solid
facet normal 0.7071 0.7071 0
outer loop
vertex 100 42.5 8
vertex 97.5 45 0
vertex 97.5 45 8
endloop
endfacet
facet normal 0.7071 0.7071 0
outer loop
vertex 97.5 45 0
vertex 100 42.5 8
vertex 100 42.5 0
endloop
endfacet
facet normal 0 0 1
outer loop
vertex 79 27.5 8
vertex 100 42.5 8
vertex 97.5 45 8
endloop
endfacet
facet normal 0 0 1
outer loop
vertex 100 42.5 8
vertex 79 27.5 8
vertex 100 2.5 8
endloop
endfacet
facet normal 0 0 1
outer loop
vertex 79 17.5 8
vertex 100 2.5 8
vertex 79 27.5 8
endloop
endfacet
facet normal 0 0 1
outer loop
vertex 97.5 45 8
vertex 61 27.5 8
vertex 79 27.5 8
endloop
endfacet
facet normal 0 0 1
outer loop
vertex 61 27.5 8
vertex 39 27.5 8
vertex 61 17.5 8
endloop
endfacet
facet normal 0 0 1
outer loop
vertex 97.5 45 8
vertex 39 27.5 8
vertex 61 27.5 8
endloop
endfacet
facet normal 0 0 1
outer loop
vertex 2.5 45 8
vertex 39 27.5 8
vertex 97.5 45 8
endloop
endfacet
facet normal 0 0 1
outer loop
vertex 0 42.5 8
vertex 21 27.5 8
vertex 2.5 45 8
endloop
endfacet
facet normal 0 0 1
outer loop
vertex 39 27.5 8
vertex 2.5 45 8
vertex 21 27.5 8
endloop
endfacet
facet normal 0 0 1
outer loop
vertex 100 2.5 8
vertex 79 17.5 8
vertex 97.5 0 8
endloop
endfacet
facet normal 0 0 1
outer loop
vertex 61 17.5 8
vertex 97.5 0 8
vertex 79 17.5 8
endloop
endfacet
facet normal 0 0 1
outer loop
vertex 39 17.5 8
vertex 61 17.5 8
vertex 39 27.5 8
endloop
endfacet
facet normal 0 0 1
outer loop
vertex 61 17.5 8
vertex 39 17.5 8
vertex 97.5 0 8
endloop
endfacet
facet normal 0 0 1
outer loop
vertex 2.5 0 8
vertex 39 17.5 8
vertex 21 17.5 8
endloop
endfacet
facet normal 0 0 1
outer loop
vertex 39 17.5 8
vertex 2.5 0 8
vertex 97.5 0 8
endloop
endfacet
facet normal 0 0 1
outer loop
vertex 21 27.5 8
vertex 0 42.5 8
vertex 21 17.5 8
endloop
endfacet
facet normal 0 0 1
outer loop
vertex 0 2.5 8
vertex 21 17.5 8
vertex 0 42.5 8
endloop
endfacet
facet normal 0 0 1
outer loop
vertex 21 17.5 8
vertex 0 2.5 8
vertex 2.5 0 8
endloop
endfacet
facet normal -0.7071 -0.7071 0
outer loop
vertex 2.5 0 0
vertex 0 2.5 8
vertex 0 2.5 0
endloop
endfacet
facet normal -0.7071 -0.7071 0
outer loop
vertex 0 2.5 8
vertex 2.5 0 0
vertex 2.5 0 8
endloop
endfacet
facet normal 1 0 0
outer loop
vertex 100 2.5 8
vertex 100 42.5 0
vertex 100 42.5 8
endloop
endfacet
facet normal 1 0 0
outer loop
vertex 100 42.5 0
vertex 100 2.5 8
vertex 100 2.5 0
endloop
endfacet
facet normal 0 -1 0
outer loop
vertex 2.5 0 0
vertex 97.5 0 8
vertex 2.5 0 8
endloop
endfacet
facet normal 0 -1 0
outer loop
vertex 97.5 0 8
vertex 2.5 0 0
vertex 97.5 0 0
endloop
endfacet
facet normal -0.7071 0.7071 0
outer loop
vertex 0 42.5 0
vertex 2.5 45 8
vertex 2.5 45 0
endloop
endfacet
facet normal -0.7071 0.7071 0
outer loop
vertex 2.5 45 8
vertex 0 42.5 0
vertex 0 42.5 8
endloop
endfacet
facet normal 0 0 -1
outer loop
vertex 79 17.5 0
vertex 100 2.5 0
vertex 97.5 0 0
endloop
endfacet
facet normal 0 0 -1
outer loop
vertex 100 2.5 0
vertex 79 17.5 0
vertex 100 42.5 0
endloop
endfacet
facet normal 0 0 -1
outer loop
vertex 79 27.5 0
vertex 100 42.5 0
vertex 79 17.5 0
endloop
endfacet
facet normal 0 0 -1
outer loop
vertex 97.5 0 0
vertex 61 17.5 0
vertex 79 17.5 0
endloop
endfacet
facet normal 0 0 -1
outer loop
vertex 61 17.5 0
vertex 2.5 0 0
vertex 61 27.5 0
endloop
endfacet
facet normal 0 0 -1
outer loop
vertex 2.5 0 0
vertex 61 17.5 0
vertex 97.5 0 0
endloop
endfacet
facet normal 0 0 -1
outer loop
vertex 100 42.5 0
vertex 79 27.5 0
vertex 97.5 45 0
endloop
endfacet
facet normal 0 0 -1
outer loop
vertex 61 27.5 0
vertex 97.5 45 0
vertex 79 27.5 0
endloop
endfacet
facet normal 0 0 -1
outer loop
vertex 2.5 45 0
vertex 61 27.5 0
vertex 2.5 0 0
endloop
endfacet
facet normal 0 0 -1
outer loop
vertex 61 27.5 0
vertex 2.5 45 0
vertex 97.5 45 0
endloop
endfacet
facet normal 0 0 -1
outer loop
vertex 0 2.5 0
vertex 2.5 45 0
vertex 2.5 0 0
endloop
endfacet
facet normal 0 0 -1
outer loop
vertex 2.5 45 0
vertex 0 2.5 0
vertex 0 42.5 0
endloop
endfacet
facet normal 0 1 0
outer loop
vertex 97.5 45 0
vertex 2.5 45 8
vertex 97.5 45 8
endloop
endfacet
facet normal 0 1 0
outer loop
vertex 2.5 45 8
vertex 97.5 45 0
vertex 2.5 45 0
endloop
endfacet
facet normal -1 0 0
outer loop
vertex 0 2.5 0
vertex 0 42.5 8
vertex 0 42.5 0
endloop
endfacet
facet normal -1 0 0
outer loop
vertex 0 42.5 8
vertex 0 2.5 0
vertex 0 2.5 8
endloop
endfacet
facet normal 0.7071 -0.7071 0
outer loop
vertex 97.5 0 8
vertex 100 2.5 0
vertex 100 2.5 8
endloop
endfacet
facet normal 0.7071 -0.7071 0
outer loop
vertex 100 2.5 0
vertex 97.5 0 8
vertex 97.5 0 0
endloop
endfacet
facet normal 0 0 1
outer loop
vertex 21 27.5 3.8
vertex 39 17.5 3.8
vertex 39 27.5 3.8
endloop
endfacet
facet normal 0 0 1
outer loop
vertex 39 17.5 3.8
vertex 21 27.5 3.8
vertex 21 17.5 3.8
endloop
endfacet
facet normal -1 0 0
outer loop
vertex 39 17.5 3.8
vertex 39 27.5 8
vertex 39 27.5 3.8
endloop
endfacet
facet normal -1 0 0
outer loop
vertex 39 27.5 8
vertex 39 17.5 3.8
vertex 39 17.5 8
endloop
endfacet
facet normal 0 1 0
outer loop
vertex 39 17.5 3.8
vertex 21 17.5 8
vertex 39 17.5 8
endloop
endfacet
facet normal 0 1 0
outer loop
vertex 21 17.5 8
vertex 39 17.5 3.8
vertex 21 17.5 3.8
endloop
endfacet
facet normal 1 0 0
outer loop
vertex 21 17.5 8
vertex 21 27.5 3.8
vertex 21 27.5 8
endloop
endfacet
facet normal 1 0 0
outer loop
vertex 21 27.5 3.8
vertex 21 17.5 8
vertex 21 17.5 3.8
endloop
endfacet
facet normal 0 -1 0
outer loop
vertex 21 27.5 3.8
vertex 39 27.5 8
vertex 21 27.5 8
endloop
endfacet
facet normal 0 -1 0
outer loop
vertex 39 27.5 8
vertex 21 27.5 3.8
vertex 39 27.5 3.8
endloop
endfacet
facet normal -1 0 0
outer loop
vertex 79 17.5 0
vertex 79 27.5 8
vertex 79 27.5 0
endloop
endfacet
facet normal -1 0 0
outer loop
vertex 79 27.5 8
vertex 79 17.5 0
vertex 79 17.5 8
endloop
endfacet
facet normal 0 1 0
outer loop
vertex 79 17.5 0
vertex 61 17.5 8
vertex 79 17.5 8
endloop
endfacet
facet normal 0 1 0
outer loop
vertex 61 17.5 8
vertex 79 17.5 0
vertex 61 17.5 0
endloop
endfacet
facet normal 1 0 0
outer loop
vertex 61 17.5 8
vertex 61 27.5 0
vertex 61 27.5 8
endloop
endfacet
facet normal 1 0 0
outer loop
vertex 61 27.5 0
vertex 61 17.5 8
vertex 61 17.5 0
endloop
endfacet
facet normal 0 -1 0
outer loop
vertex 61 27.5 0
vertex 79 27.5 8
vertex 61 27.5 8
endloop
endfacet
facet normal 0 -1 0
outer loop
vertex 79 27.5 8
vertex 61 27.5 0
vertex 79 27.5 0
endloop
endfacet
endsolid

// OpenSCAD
$fn = 32;

// ----------------------------------------------------------------------
// Windowed plate: 2 voids, 100 x 45 x 8 mm
// ----------------------------------------------------------------------

// --- parameters (mm) ---
plate_l = 100;            // plate length, X
plate_w = 45;             // plate width, Y
plate_t = 8;              // plate thickness, Z
edge_margin = 10;         // wall from the plate edge to any window
windows = 2;              // number of windows in the row
win_l = 18;               // window length
win_w = 10;               // window width
win_pitch = 40;           // window pitch along X
depth_1 = 4.2;            // depth of void 1 (full thickness = through)
depth_2 = 8;              // depth of void 2 (full thickness = through)
corner_c = 2.5;           // corner chamfer of the plate

profile = [[2.5, 0], [97.5, 0], [100, 2.5], [100, 42.5], [97.5, 45], [2.5, 45], [0, 42.5], [0, 2.5]];  // primary outline, 8 points, counter clockwise
void_1 = [[21, 17.5], [39, 17.5], [39, 27.5], [21, 27.5]];  // window 1 of the row, 4 points
void_2 = [[61, 17.5], [79, 17.5], [79, 27.5], [61, 27.5]];  // window 2 of the row, 4 points

// --- the one profile operation ---
difference() {
  linear_extrude(height = plate_t) polygon(points = profile);
  translate([0, 0, plate_t - depth_1])
    linear_extrude(height = depth_1 + 1) polygon(points = void_1);
  translate([0, 0, -1])
    linear_extrude(height = plate_t + 2) polygon(points = void_2);
}
